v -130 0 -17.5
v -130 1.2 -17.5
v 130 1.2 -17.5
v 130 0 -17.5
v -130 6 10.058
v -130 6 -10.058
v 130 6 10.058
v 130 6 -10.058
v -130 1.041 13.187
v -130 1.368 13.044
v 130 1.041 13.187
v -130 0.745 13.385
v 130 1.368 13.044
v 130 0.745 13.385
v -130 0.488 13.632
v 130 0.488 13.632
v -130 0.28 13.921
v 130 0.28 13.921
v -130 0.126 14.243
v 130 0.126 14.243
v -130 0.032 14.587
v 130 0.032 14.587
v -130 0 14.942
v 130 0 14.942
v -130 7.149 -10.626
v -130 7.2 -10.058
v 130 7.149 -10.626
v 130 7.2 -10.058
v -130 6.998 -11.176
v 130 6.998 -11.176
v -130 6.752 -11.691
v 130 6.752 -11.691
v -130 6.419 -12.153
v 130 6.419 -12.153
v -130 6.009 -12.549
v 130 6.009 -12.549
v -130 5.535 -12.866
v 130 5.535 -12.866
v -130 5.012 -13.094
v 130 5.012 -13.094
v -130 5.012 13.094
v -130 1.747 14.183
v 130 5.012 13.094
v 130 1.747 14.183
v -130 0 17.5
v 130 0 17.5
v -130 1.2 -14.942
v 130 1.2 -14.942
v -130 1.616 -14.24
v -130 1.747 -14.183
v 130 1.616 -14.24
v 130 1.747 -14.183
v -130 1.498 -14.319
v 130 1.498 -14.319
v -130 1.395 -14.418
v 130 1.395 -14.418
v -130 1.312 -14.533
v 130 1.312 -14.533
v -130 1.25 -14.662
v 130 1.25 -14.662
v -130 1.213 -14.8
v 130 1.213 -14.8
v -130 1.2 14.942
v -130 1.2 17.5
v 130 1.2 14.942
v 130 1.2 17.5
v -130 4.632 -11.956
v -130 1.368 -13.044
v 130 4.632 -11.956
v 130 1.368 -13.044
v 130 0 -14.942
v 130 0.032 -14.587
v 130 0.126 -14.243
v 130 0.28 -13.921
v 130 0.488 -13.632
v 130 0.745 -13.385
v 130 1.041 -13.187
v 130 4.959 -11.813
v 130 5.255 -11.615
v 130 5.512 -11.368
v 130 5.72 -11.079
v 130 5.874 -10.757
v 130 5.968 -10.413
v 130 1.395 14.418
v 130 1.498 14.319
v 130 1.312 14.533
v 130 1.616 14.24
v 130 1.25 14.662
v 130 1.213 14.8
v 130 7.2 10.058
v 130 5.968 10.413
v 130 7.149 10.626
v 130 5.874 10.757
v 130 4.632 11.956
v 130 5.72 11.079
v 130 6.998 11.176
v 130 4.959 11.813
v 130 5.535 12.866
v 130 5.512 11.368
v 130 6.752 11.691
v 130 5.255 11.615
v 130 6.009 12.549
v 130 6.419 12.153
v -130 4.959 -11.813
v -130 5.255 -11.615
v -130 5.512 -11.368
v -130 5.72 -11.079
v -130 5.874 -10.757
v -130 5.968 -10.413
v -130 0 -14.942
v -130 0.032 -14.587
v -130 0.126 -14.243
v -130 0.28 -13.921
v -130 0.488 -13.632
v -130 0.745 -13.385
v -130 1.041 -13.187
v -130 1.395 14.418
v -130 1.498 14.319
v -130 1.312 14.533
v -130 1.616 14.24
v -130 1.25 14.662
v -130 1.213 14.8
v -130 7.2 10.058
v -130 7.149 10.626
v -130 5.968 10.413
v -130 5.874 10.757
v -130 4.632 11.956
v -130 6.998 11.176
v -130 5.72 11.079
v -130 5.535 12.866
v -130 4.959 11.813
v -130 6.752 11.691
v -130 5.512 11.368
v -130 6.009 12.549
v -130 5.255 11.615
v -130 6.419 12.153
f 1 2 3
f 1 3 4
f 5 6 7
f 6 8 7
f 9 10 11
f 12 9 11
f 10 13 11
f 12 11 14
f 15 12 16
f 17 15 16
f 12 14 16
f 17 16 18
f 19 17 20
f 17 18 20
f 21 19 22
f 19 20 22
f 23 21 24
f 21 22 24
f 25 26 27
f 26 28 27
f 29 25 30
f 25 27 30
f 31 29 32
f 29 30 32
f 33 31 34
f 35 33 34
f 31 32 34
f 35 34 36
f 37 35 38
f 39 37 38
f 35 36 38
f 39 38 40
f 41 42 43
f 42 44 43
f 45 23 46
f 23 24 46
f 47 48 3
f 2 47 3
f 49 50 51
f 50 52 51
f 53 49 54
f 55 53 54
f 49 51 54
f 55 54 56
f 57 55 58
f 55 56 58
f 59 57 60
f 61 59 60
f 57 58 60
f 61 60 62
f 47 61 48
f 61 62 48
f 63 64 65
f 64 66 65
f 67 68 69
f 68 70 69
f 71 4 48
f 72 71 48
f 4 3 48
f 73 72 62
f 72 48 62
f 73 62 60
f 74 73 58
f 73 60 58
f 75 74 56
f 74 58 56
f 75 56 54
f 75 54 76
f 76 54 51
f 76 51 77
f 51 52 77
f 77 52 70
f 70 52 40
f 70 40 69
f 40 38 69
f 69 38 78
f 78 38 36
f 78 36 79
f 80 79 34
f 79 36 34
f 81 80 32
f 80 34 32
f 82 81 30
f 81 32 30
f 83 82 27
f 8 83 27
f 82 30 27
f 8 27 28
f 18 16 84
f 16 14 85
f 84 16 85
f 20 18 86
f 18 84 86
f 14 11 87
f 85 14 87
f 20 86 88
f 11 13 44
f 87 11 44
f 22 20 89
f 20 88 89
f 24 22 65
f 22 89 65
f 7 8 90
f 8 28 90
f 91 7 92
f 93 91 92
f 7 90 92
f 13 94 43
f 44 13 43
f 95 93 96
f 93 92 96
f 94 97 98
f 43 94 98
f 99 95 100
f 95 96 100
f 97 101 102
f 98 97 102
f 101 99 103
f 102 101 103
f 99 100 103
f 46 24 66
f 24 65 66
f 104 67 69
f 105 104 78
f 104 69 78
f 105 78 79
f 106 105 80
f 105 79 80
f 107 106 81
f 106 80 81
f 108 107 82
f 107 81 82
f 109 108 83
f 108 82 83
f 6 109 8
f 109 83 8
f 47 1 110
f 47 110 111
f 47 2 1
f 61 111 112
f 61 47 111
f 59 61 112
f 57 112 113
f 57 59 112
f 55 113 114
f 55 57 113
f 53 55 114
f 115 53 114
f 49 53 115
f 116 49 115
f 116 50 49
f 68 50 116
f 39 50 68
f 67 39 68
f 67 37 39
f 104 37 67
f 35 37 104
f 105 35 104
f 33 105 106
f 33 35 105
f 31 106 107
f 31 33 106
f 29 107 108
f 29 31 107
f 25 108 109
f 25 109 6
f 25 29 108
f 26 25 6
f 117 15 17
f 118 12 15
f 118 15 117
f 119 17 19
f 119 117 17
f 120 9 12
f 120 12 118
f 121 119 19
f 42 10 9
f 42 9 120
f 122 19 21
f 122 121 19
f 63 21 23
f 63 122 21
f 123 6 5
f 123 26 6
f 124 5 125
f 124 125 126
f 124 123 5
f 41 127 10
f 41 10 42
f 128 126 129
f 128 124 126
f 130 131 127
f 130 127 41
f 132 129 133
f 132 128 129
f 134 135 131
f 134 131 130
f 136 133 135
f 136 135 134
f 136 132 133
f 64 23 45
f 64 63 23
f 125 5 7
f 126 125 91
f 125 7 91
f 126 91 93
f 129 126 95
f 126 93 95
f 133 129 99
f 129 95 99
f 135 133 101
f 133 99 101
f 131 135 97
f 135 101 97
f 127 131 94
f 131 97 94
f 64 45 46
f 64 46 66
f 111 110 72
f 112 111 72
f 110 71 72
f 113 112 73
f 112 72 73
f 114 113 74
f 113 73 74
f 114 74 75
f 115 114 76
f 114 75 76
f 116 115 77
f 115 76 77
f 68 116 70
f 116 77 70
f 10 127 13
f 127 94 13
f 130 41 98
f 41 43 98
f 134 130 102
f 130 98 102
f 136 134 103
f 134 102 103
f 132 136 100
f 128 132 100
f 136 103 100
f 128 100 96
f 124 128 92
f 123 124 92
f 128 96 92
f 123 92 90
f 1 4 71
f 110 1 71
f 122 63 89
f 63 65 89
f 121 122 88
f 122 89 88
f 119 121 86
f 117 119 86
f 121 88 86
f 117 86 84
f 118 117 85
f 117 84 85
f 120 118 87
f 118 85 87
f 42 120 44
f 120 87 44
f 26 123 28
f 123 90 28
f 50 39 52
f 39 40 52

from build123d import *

# Parameters (mm, degrees)
EXTRUDE_1_DEPTH = 130


with BuildPart() as part:
    # 草图1 → 凸台-拉伸1 (new, symmetric)
    with BuildSketch(Plane(origin=(0, 0, 0), x_dir=(0, 0, -1), z_dir=(1, 0, 0))):
        with BuildLine():
            Line((17.5, 0), (14.94151844, 0))
            ThreePointArc((14.94151844, 0), (13.772097871, 0.37751563), (13.044151844, 1.367544468))
            Line((13.044151844, 1.367544468), (11.955848156, 4.632455532))
            ThreePointArc((11.955848156, 4.632455532), (11.227902129, 5.62248437), (10.05848156, 6))
            Line((10.05848156, 6), (-10.05848156, 6))
            ThreePointArc((-10.05848156, 6), (-11.227902129, 5.62248437), (-11.955848156, 4.632455532))
            Line((-11.955848156, 4.632455532), (-13.044151844, 1.367544468))
            ThreePointArc((-13.044151844, 1.367544468), (-13.772097871, 0.37751563), (-14.94151844, 0))
            Line((-14.94151844, 0), (-17.5, 0))
            Line((-17.5, 0), (-17.5, 1.2))
            Line((-17.5, 1.2), (-14.94151844, 1.2))
            ThreePointArc((-14.94151844, 1.2), (-14.473750212, 1.351006252), (-14.182571802, 1.747017787))
            Line((-14.182571802, 1.747017787), (-13.094268114, 5.011928851))
            ThreePointArc((-13.094268114, 5.011928851), (-11.929554471, 6.595974993), (-10.05848156, 7.2))
            Line((-10.05848156, 7.2), (10.05848156, 7.2))
            ThreePointArc((10.05848156, 7.2), (11.929554471, 6.595974993), (13.094268114, 5.011928851))
            Line((13.094268114, 5.011928851), (14.182571802, 1.747017787))
            ThreePointArc((14.182571802, 1.747017787), (14.473750212, 1.351006252), (14.94151844, 1.2))
            Line((14.94151844, 1.2), (17.5, 1.2))
            Line((17.5, 1.2), (17.5, 0))
        make_face()
    extrude(amount=EXTRUDE_1_DEPTH, both=True)


solid = part.part
